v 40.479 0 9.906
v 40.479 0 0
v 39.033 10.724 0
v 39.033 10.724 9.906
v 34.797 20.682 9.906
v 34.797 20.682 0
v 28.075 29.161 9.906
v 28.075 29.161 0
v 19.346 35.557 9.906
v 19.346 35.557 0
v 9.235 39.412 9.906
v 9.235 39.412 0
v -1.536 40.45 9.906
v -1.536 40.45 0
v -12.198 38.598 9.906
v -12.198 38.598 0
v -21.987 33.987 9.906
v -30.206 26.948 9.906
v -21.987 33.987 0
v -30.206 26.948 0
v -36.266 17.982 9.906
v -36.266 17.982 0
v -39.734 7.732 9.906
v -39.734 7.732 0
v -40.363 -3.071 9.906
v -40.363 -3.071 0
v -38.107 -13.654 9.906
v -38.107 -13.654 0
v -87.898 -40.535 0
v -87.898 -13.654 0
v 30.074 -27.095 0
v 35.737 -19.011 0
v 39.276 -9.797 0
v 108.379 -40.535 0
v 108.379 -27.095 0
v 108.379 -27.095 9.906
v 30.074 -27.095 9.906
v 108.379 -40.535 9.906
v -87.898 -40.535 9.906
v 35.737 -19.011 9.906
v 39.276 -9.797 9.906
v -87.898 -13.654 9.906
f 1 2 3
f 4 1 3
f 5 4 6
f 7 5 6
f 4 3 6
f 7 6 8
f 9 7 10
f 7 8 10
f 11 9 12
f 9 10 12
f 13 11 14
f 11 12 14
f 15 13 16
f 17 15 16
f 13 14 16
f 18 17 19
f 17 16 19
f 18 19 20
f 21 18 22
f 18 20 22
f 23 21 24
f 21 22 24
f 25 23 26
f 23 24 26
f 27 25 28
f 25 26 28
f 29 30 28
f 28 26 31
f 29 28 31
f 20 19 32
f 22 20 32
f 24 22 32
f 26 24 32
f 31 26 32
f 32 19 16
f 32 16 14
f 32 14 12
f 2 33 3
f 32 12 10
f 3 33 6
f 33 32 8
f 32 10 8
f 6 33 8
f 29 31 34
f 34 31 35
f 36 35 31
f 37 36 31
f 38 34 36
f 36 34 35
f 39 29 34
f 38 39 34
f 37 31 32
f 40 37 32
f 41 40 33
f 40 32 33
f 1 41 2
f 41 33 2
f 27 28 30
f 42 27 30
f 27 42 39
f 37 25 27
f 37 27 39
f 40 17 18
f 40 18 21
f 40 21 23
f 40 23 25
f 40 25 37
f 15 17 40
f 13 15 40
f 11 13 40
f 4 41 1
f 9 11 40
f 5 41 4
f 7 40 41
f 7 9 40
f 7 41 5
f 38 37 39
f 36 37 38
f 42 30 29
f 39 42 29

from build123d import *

# Parameters (mm, degrees)
F1_DEPTH = 9.906


# Not quite as in the source:
# - a feature names something its author has since deleted; it is built from what else it names


with BuildPart() as f1:
    # F0 (on Top) → F1 (new body)
    with BuildSketch(Plane.XY):
        with BuildLine():
            Line((-38.1069101836, -13.6540351038), (-87.8979010638, -13.6540351038))
            Line((-87.8979010638, -13.6540351038), (-87.8979010638, -40.5354308852))
            Line((-87.8979010638, -40.5354308852), (20.0543733488, -40.5354308852))
            Line((20.0543733488, -40.5354308852), (20.0543733488, -35.1623575424))
            ThreePointArc((20.0543733488, -35.1623575424), (-14.0401390689, -37.9663505394), (-38.1069101836, -13.6540351038))
        make_face()
        with BuildLine():
            ThreePointArc((30.0739874694, -27.0947329945), (25.3867048086, -31.5291055584), (20.0543733488, -35.1623575424))
            Line((20.0543733488, -35.1623575424), (20.0543733488, -40.5354308852))
            Line((20.0543733488, -40.5354308852), (108.3789337528, -40.5354308852))
            Line((108.3789337528, -40.5354308852), (108.3789337528, -27.0947329945))
            Line((108.3789337528, -27.0947329945), (30.0739874694, -27.0947329945))
        make_face()
        with BuildLine():
            Line((20.0543733488, -13.6540351038), (-38.1069101836, -13.6540351038))
            ThreePointArc((-38.1069101836, -13.6540351038), (-14.0401390689, -37.9663505394), (20.0543733488, -35.1623575424))
            Line((20.0543733488, -35.1623575424), (20.0543733488, -27.0947329945))
            Line((20.0543733488, -27.0947329945), (20.0543733488, -13.6540351038))
        make_face()
        with BuildLine():
            Line((20.0543733488, -27.0947329945), (20.0543733488, -35.1623575424))
            ThreePointArc((20.0543733488, -35.1623575424), (25.3867048086, -31.5291055584), (30.0739874694, -27.0947329945))
            Line((30.0739874694, -27.0947329945), (20.0543733488, -27.0947329945))
        make_face()
        with BuildLine():
            ThreePointArc((40.4792450319, 0), (-6.9292973534, 39.8817516734), (-38.1069101836, -13.6540351038))
            Line((-38.1069101836, -13.6540351038), (20.0543733488, -13.6540351038))
            Line((20.0543733488, -13.6540351038), (20.0543733488, -27.0947329945))
            Line((20.0543733488, -27.0947329945), (30.0739874694, -27.0947329945))
            ThreePointArc((30.0739874694, -27.0947329945), (37.7885008052, -14.5120117574), (40.4792450319, 0))
        make_face()
    extrude(amount=F1_DEPTH)


solid = f1.part
